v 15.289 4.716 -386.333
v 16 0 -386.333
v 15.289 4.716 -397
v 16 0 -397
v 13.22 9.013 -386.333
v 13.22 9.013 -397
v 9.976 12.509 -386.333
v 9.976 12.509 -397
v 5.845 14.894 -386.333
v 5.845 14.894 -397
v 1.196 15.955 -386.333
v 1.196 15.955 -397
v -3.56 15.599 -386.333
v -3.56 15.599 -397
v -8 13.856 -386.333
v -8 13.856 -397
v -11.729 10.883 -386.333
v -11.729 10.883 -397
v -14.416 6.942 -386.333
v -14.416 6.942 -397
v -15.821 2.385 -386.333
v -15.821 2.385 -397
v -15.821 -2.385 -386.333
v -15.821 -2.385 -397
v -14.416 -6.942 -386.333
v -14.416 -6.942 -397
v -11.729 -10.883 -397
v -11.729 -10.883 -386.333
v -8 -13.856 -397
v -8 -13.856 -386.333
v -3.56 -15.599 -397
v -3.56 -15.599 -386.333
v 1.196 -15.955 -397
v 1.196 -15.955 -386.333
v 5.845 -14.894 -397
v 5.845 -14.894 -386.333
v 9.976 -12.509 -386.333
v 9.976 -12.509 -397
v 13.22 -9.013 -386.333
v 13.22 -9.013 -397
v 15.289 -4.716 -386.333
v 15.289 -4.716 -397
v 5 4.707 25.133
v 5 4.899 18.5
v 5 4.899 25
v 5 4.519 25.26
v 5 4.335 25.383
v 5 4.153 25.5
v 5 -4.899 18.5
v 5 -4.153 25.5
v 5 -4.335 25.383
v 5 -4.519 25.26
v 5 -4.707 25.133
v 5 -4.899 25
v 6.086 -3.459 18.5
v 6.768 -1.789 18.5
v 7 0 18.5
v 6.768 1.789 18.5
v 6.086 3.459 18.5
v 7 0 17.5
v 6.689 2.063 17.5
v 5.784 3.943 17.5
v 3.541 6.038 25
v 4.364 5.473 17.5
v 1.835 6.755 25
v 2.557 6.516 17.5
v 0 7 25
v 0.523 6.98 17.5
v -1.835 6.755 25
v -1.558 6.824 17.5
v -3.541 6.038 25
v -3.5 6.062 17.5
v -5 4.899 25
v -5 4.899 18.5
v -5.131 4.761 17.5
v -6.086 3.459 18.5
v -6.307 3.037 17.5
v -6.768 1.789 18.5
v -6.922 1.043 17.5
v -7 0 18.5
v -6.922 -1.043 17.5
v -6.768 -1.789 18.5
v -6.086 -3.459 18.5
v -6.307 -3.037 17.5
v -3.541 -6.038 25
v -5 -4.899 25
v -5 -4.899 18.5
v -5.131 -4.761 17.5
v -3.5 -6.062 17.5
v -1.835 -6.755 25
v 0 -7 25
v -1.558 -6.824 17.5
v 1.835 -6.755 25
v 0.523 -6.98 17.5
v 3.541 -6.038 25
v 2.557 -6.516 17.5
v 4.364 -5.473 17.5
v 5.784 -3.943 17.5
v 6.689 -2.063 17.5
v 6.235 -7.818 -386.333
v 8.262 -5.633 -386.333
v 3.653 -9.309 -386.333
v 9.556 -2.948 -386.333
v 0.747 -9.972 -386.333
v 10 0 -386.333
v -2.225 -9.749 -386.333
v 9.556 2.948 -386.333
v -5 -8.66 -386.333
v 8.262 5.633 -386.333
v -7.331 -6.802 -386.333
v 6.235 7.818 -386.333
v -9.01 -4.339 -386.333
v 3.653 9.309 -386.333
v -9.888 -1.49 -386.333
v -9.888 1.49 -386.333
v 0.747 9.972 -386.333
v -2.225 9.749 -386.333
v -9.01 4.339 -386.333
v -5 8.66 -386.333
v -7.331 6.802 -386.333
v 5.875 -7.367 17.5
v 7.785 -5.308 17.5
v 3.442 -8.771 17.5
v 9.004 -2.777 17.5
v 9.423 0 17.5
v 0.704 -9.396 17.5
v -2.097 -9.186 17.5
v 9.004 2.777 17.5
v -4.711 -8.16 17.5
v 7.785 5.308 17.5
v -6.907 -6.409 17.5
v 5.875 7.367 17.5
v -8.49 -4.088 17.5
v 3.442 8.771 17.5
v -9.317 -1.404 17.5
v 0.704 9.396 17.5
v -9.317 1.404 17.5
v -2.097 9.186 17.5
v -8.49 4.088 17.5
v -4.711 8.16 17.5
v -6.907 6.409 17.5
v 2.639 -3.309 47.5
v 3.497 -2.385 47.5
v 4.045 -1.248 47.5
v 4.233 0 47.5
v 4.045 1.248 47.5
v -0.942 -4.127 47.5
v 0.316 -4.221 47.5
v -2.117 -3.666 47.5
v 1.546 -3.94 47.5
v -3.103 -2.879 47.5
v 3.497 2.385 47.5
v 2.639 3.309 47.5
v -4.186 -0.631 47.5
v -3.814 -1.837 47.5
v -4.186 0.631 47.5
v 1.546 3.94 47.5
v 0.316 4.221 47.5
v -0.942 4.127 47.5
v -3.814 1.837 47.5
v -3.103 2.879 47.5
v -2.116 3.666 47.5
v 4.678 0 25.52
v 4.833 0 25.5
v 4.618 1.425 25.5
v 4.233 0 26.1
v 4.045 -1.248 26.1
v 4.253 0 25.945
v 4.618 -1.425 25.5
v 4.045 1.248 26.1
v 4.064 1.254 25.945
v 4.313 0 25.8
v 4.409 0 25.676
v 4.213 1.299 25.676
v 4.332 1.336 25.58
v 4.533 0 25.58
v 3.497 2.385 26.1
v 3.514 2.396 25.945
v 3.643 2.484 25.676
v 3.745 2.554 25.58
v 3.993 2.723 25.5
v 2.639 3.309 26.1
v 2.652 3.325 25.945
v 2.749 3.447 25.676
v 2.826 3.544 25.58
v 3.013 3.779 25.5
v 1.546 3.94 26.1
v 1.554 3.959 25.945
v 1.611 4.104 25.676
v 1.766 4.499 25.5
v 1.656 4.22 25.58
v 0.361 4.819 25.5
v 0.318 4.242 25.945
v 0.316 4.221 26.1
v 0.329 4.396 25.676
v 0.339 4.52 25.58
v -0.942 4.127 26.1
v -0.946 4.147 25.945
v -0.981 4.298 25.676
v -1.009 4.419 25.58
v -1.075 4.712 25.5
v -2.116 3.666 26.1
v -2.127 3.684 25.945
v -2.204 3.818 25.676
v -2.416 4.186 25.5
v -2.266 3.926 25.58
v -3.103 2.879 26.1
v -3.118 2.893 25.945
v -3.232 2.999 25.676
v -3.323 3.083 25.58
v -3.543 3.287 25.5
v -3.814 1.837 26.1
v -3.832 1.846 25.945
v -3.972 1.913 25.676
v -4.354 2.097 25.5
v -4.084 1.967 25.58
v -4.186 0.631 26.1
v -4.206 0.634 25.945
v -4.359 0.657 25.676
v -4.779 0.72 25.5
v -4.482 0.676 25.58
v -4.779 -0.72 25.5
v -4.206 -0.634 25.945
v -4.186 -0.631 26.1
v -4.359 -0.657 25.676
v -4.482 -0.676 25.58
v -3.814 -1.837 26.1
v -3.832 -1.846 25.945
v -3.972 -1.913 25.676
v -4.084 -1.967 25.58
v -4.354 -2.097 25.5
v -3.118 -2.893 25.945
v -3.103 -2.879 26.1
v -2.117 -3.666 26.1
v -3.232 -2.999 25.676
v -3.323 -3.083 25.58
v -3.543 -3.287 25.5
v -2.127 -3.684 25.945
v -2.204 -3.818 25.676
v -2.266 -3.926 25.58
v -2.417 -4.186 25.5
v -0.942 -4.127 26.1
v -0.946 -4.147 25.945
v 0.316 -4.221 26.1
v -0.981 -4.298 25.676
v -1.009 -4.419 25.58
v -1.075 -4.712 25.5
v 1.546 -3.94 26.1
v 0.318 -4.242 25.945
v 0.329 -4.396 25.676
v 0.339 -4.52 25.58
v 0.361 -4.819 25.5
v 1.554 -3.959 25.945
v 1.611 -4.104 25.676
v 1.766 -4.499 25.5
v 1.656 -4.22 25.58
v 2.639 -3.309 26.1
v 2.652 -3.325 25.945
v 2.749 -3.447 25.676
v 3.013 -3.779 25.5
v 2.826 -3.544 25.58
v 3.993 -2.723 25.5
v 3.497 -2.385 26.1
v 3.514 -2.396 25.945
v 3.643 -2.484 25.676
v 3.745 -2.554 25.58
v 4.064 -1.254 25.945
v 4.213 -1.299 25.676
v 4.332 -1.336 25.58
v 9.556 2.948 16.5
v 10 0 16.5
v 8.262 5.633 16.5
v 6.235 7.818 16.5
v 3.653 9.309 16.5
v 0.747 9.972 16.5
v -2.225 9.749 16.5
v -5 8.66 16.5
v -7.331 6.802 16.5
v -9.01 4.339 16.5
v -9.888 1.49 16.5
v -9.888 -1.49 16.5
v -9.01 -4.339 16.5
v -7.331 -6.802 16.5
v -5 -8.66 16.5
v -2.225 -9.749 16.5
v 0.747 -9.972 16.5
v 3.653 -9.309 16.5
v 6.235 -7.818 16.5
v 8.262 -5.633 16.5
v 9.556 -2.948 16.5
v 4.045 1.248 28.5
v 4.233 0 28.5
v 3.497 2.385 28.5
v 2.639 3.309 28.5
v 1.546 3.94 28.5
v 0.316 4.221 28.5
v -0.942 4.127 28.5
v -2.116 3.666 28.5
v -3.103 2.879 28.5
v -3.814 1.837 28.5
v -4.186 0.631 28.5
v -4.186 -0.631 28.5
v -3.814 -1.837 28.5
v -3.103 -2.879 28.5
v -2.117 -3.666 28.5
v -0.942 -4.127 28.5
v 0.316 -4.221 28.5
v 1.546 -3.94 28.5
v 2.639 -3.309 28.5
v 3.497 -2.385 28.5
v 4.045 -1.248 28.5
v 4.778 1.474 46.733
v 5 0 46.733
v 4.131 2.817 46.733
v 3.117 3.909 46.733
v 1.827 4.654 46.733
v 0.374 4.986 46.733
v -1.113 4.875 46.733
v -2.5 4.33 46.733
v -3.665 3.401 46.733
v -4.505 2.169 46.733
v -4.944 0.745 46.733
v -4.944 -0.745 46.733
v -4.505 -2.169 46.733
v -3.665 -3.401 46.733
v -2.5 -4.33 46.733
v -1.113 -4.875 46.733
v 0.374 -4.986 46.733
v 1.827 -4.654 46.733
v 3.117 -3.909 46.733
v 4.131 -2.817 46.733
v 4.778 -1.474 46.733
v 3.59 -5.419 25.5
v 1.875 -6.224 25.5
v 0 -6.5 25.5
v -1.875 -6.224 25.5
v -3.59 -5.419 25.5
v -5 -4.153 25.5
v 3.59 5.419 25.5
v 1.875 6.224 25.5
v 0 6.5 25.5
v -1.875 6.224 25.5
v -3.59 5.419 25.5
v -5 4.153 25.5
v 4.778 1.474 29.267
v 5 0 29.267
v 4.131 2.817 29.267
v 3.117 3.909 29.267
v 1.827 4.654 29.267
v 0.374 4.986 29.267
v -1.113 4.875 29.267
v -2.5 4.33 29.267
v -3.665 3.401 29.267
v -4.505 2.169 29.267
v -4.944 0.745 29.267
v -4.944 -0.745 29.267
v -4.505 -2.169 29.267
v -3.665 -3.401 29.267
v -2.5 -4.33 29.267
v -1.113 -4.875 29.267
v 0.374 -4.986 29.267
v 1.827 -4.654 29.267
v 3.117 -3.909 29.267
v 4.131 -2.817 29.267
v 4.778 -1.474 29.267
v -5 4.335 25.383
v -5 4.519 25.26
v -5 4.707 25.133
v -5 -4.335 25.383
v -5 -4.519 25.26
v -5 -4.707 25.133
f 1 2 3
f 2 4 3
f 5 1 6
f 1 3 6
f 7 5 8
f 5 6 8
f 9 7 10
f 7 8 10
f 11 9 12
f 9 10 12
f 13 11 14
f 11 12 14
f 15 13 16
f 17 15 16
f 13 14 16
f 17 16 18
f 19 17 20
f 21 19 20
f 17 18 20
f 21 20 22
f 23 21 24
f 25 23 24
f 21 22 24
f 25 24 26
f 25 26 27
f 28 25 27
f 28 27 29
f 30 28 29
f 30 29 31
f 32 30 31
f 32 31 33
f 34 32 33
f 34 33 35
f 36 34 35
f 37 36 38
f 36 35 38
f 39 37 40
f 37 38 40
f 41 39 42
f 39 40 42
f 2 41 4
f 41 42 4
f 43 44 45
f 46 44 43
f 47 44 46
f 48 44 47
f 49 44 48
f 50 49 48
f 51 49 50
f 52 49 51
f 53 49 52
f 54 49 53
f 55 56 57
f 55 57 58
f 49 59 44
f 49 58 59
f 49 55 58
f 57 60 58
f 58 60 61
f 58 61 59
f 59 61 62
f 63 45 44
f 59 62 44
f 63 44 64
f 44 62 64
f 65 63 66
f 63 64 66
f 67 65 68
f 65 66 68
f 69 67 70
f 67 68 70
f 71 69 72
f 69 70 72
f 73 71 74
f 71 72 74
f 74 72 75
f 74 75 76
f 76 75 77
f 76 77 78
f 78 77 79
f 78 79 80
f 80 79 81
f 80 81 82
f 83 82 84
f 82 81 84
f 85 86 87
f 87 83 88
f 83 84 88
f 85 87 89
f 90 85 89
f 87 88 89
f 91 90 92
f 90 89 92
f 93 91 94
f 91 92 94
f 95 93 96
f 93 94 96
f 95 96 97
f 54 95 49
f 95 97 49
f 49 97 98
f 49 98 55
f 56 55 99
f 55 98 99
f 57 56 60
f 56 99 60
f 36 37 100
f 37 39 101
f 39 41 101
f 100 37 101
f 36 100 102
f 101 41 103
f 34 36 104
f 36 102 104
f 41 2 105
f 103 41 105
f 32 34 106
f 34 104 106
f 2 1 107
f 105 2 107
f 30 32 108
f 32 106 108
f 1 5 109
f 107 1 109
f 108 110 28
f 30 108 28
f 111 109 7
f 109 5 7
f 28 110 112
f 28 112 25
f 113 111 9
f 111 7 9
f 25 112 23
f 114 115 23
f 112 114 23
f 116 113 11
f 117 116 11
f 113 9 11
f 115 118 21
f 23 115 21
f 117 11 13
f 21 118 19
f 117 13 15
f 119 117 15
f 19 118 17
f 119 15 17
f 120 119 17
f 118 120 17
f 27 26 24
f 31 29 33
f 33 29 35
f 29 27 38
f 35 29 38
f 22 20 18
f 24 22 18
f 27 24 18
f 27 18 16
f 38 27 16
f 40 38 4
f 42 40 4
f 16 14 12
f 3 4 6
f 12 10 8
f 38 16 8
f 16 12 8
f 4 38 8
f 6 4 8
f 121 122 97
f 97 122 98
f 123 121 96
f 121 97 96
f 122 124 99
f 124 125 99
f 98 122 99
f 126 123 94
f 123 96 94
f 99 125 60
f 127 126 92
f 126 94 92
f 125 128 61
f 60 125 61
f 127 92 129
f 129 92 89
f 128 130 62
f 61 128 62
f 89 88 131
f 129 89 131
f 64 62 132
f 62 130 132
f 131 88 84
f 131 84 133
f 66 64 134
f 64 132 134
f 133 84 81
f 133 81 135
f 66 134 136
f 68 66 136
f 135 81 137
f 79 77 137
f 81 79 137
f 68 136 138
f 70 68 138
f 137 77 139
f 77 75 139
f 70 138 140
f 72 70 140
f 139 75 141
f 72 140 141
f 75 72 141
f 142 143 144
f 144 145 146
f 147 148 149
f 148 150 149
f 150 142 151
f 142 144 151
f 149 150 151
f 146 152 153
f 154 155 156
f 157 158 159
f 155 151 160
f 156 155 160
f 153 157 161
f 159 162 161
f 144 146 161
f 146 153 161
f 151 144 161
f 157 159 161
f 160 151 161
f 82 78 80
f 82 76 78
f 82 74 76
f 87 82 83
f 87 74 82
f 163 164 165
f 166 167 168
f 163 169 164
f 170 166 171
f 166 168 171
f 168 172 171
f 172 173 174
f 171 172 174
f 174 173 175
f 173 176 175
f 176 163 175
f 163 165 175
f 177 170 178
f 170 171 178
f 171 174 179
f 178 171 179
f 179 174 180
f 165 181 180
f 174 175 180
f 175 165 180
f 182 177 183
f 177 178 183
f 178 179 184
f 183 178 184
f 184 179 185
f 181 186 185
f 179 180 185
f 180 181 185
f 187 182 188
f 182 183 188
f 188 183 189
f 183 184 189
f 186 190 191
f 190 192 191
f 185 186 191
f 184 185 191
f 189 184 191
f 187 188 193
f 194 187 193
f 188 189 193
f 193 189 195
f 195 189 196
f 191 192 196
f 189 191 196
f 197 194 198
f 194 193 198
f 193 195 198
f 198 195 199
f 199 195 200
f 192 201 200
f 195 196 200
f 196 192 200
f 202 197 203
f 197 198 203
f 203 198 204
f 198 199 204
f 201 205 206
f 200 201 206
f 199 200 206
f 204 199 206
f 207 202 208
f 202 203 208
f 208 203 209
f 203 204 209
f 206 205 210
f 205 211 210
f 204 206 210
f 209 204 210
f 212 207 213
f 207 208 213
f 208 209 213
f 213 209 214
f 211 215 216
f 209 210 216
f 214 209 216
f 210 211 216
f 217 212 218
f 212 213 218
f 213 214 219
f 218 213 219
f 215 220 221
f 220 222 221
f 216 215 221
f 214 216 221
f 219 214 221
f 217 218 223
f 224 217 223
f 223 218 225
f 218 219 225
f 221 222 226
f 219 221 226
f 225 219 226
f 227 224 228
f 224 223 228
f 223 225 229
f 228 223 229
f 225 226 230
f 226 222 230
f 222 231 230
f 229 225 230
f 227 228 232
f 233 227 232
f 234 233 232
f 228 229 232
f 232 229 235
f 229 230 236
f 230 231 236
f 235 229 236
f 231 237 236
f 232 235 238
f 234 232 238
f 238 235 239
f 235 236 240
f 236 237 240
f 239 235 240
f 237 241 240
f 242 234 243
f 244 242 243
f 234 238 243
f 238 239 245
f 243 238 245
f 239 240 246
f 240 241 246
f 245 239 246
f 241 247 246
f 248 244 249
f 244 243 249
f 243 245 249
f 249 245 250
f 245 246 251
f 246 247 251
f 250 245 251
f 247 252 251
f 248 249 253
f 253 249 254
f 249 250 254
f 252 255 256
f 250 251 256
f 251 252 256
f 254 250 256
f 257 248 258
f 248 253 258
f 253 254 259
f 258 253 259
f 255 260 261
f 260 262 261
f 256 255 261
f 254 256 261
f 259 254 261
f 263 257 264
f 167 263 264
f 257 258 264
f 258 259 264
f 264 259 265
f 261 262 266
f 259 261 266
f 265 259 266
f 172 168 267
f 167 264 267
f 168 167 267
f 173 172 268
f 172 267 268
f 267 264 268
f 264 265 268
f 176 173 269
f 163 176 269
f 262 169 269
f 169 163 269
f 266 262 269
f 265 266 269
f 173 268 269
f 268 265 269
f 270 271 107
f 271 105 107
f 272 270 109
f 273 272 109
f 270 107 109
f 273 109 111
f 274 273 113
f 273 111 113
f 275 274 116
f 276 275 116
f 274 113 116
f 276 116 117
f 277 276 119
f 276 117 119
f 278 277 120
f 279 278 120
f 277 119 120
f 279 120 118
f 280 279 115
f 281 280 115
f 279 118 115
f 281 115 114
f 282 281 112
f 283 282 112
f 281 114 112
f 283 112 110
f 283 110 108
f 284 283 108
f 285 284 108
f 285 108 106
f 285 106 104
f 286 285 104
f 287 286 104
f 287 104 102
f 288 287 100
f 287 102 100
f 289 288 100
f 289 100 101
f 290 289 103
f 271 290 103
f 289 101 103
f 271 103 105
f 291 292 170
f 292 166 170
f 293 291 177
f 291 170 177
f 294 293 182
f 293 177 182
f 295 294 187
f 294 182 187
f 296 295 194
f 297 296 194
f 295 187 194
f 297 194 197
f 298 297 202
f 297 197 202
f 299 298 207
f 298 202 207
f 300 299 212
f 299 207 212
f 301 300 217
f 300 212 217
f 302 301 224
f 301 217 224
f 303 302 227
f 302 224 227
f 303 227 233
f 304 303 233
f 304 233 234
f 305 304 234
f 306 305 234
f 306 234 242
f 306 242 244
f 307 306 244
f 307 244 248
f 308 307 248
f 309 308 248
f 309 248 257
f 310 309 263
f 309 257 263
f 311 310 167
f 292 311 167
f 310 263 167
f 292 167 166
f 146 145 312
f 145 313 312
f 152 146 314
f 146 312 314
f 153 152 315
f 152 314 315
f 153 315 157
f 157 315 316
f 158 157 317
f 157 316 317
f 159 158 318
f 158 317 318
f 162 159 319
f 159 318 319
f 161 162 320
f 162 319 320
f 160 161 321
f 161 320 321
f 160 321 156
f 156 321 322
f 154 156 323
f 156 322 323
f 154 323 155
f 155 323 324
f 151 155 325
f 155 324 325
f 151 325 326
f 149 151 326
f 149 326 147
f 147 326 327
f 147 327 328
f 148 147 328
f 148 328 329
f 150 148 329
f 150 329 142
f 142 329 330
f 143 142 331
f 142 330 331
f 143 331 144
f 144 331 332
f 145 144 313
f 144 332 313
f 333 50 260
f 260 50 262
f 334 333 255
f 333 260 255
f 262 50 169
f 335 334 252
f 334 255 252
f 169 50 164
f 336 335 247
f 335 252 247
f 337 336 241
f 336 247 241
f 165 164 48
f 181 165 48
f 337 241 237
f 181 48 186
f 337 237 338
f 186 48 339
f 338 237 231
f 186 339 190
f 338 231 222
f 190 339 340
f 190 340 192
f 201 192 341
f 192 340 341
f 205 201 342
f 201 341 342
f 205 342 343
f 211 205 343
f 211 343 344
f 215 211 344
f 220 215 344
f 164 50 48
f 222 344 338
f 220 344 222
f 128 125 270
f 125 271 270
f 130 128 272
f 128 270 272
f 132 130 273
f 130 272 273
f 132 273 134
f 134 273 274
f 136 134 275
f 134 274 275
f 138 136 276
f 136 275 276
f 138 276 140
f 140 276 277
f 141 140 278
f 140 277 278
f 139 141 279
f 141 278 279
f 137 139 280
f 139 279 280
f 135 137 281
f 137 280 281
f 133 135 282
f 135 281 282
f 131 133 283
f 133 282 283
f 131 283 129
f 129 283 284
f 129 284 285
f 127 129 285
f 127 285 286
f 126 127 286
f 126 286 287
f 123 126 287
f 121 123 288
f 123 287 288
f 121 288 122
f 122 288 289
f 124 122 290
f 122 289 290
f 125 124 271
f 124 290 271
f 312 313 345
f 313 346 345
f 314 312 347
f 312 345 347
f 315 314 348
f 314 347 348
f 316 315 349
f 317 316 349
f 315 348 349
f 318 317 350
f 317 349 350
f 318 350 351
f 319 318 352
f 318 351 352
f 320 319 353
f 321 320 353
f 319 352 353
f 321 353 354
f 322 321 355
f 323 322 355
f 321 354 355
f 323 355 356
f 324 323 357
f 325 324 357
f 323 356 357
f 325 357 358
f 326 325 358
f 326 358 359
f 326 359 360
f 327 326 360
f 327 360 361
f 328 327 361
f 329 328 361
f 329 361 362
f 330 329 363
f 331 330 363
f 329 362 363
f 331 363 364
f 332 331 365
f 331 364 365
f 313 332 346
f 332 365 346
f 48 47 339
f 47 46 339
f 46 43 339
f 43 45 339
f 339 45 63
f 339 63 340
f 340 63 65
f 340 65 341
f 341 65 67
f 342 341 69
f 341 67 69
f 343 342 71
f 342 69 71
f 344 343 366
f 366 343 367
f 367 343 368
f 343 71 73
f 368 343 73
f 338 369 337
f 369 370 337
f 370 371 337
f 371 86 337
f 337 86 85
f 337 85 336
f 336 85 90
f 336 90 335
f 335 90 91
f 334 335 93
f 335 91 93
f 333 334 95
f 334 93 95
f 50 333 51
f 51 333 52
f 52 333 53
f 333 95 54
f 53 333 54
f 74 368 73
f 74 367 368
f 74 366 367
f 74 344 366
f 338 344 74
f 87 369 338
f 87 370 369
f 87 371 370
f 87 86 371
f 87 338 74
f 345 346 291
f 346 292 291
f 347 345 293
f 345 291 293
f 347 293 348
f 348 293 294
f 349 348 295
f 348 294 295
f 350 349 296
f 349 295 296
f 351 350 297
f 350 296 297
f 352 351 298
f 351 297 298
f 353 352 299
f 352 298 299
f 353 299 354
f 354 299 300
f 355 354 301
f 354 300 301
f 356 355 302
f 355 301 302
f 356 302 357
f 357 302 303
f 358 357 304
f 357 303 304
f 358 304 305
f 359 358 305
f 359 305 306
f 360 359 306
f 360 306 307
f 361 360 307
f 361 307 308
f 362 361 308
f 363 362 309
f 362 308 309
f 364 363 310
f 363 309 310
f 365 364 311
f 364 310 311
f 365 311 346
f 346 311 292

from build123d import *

# Parameters (mm, degrees)
CUT_EXTRUDE1_DEPTH      = 14
CUT_EXTRUDE1_DEPTH_BACK = 14


with BuildPart() as part:
    # Sketch1 → Revolve1 (revolve)
    with BuildSketch(Plane(origin=(0, 0, 0), x_dir=(0, 0, -1), z_dir=(1, 0, 0))):
        Polygon((-25.5, 0), (-25.5, 6.5), (-25, 7), (-17.5, 7), (-17.5, 9.422649731), (-16.5, 10), (386.333333333, 10), (386.333333333, 16), (397, 16), (397, 0), align=None)
    revolve(axis=Axis((0, 0, -397), (0, 0, 1)))

    # Sketch2 → Cut-Extrude1 (cut, two sides: drawn at the far end of the back side and taken through both)
    with BuildSketch(Plane(origin=(0, 0, 0), x_dir=(1, 0, 0), z_dir=(0, 1, 0)).offset(-CUT_EXTRUDE1_DEPTH_BACK)):
        Polygon((-8, -18.5), (-8, -28.5), (8, -28.5), (8, -18.5), (5, -18.5), (5, -25.5), (-5, -25.5), (-5, -18.5), align=None)
    extrude(amount=CUT_EXTRUDE1_DEPTH + CUT_EXTRUDE1_DEPTH_BACK, mode=Mode.SUBTRACT)

    # Sketch3 → Revolve2 (revolve)
    with BuildSketch(Plane(origin=(0, 0, 0), x_dir=(0, 0, -1), z_dir=(1, 0, 0))):
        with BuildLine():
            Line((-47.5, 0), (-47.5, 4.233))
            Line((-47.5, 4.233), (-46.733, 5))
            Line((-46.733, 5), (-29.267, 5))
            Line((-29.267, 5), (-28.5, 4.233))
            Line((-28.5, 4.233), (-26.1, 4.233))
            ThreePointArc((-26.1, 4.233), (-25.675735931, 4.408735931), (-25.5, 4.833))
            Line((-25.5, 4.833), (-25.5, 0))
            Line((-25.5, 0), (-47.5, 0))
        make_face()
    revolve(axis=Axis((0, 0, 25.5), (0, 0, 1)))


solid = part.part
